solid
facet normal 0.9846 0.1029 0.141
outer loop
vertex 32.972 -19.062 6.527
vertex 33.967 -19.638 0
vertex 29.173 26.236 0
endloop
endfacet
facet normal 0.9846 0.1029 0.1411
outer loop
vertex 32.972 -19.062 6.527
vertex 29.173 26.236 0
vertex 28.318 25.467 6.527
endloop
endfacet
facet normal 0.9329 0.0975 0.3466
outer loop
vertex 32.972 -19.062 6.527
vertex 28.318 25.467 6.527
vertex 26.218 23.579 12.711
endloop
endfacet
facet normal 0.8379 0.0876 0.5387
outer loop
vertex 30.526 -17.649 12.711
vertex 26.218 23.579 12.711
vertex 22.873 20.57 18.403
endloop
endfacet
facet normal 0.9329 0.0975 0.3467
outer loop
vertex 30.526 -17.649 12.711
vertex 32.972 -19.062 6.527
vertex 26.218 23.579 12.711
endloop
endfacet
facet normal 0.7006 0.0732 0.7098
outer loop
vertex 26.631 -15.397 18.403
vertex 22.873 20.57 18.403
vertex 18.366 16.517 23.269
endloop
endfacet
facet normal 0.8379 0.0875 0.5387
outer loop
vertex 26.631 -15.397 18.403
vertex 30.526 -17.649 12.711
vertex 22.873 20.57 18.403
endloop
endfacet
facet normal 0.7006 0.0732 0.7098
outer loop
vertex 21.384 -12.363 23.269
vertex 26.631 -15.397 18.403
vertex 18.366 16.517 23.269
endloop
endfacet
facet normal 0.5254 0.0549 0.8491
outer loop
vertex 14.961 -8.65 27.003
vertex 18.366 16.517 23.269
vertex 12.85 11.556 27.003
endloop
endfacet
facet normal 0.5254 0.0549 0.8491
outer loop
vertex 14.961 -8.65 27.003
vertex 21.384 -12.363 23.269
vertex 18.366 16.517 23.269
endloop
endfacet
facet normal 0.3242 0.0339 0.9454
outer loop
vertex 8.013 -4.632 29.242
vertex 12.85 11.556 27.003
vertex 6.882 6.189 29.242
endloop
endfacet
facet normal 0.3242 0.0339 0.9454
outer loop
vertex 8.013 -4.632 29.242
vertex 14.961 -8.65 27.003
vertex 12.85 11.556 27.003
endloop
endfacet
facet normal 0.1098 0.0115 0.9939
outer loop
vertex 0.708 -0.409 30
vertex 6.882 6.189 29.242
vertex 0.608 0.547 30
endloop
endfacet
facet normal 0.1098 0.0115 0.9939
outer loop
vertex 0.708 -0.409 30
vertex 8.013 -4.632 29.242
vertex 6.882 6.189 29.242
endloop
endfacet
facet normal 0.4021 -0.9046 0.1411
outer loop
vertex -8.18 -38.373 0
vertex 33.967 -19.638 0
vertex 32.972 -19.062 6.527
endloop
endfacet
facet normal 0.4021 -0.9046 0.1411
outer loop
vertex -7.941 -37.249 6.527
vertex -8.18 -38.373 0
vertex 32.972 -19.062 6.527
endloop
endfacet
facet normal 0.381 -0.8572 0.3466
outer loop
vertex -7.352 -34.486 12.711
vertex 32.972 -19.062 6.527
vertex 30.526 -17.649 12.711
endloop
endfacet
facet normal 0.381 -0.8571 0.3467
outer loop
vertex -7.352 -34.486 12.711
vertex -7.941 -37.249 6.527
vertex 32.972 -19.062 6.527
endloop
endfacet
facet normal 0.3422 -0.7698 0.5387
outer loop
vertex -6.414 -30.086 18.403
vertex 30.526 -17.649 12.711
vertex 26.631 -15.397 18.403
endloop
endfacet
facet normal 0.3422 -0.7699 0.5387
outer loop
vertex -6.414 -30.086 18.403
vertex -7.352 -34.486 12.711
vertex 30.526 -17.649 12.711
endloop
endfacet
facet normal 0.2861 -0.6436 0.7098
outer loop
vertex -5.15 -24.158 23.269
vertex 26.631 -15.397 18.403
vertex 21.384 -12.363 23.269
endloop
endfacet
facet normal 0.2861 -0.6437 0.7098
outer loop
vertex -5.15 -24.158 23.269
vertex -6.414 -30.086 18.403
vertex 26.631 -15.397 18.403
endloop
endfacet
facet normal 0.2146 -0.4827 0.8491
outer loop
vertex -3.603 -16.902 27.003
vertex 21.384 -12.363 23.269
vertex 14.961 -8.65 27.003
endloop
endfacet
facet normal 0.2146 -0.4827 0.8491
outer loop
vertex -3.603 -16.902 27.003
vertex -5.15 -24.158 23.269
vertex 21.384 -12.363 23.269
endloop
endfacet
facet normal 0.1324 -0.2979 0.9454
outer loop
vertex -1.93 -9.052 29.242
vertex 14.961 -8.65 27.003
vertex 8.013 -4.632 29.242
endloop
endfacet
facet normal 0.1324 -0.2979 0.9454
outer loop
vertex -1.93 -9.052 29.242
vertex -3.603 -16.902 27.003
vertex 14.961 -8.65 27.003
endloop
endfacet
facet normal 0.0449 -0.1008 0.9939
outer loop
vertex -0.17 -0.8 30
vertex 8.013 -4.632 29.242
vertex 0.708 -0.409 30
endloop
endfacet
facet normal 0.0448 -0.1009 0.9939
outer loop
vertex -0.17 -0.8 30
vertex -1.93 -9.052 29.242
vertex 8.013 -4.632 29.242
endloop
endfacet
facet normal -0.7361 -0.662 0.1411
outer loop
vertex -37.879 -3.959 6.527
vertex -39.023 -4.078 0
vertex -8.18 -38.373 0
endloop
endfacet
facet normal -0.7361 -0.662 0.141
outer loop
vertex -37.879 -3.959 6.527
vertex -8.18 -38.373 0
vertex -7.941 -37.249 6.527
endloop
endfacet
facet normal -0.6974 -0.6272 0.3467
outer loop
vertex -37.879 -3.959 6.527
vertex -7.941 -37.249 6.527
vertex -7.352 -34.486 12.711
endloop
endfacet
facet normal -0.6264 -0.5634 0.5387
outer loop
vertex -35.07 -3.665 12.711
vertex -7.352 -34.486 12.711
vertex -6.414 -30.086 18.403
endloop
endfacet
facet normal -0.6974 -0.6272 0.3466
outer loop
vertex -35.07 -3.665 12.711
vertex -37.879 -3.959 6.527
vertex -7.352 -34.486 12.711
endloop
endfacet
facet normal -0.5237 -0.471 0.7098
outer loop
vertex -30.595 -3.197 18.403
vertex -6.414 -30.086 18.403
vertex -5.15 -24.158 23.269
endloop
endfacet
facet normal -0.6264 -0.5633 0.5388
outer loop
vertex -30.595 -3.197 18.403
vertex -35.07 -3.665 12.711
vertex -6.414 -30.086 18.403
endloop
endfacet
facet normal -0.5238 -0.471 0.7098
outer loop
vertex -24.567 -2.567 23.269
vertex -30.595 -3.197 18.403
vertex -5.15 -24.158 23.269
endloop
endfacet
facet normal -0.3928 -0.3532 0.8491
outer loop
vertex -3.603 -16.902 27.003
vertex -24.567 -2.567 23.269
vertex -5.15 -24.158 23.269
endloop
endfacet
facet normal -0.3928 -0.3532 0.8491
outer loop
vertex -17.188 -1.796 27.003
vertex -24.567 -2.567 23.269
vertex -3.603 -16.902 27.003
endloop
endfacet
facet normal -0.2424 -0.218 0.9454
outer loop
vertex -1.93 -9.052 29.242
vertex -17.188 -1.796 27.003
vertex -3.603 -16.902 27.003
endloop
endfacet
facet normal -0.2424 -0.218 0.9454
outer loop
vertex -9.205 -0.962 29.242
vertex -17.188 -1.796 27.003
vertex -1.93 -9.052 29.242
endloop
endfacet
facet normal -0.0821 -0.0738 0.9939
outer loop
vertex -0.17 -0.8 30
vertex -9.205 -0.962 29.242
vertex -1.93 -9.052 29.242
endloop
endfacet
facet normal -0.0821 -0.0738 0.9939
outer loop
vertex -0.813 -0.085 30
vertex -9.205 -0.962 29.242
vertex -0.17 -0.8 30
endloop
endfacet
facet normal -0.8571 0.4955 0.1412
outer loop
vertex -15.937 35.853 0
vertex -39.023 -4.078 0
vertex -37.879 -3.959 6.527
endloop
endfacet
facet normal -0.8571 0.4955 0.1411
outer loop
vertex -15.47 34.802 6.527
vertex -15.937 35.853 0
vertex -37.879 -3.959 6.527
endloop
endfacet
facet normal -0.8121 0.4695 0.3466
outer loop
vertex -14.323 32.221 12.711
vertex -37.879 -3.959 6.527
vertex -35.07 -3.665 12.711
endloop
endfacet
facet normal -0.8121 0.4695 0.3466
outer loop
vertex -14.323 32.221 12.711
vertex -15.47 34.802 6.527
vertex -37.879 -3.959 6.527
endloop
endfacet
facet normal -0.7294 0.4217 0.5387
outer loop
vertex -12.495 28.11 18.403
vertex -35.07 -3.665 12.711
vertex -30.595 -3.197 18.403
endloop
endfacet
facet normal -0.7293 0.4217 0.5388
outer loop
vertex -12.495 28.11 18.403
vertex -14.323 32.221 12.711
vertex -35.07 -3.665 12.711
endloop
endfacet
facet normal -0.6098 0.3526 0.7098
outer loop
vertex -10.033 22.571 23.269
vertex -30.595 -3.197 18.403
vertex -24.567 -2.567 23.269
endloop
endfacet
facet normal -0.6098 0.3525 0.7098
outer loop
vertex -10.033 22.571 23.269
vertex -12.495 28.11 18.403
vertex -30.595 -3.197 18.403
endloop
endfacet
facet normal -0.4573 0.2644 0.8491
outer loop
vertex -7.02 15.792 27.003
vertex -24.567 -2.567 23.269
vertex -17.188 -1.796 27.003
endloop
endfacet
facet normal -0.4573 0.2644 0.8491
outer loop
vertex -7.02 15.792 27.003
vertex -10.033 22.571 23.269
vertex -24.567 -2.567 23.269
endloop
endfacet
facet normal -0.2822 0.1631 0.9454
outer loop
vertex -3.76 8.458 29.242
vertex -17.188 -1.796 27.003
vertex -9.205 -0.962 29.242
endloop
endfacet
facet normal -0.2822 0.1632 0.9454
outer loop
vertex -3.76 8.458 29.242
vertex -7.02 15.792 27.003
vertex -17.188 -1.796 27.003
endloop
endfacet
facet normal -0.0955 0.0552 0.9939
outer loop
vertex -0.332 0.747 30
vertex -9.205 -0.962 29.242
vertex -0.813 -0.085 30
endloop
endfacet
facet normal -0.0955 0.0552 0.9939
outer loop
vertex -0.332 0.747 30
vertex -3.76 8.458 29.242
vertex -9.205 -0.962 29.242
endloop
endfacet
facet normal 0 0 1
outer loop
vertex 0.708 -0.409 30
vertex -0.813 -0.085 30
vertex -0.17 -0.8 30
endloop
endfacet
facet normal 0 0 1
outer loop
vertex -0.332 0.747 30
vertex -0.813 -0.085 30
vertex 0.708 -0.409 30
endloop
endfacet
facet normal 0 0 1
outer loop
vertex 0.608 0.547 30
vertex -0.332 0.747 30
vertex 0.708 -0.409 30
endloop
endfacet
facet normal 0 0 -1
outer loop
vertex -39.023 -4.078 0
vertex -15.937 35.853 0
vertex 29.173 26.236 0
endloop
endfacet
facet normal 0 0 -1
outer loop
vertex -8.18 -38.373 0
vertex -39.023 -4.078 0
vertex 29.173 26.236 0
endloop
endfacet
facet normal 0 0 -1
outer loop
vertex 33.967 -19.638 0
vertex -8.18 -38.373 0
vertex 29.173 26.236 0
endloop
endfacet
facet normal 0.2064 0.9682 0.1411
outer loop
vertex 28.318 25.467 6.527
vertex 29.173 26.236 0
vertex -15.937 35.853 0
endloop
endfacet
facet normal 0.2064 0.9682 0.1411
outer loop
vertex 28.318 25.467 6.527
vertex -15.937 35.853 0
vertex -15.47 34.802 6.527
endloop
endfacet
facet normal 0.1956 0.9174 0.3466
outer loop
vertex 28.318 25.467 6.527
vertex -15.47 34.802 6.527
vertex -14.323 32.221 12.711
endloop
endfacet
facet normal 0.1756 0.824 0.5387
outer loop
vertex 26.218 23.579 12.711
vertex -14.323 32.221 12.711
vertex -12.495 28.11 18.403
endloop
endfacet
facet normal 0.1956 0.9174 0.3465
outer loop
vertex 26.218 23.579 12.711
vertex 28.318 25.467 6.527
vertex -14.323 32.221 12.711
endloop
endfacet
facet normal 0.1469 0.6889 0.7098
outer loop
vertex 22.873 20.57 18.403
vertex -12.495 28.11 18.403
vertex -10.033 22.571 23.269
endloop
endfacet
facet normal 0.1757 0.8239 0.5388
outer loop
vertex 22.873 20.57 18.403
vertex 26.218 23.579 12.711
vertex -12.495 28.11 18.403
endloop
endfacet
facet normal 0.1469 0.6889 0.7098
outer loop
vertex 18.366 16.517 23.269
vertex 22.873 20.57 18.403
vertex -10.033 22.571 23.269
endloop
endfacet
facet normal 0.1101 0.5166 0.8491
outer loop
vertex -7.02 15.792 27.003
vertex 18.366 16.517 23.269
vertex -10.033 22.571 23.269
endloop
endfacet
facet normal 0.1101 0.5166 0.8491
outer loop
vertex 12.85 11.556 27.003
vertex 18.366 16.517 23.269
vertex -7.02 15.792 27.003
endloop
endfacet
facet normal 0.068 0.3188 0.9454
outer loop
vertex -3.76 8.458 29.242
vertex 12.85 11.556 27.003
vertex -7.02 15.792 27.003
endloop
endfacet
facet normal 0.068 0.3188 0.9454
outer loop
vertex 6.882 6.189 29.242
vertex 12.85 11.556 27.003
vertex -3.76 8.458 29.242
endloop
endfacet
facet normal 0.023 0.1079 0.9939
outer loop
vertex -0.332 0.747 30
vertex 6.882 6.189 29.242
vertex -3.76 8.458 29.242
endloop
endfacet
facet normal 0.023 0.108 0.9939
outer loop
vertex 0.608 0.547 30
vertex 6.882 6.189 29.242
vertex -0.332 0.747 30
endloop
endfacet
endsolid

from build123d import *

# Parameters (mm, degrees)
F1_DEPTH    = 30
F2_T1_DEPTH = 201.5265861528
F2_T3_DEPTH = 201.5265861528
F2_T5_DEPTH = 201.5265861528
F2_T7_DEPTH = 201.5265861528
F2_T9_DEPTH = 201.5265861528


# Not quite as in the source:
# - a fillet or chamfer that OpenCascade refuses, or shapes differently, is made with other operations: its cross-section is extruded or revolved along the edge and cut away or added


with BuildPart() as f1:
    # F0 (on Top) → F1 (new body)
    with BuildSketch(Plane.XY):
        Polygon((-15.9371768066, 35.8527074811), (-39.0228095523, -4.0780599472), (-8.1802458333, -38.3730871366), (33.967139591, -19.6378121565), (29.1730926011, 26.2362517592), align=None)
    extrude(amount=F1_DEPTH)

    # F2: fillet of radius 31.1 on 5 edges, made by hand

    # F2_s2 → F2_t1 (cut)
    with BuildSketch(Plane(origin=(50.4334024594, 87.2336698068, 0), x_dir=(0, 0, 1), z_dir=(-0.5005136386, -0.8657286512, 0))):
        with BuildLine():
            ThreePointArc((0, 31.7420396575), (21.2765502256, 22.2601101881), (30, 0.6614991217))
            Line((30, 0.6614991217), (30, 31.7420396575))
            Line((30, 31.7420396575), (0, 31.7420396575))
        make_face()
    extrude(amount=F2_T1_DEPTH, mode=Mode.SUBTRACT)

    # F2_s4 → F2_t3 (cut)
    with BuildSketch(Plane(origin=(-67.379371666, 74.9217025, 0), x_dir=(0, 0, 1), z_dir=(0.6686896548, -0.7435416233, 0))):
        with BuildLine():
            ThreePointArc((0, 31.7420396575), (21.2765502256, 22.2601101881), (30, 0.6614991217))
            Line((30, 0.6614991217), (30, 31.7420396575))
            Line((30, 31.7420396575), (0, 31.7420396575))
        make_face()
    extrude(amount=F2_T3_DEPTH, mode=Mode.SUBTRACT)

    # F2_s6 → F2_t5 (cut)
    with BuildSketch(Plane(origin=(-92.0761442896, -40.9295111669, 0), x_dir=(0, 0, 1), z_dir=(0.9137865732, 0.406194656, 0))):
        with BuildLine():
            ThreePointArc((0, 31.7420396575), (21.2765502256, 22.2601101881), (30, 0.6614991217))
            Line((30, 0.6614991217), (30, 31.7420396575))
            Line((30, 31.7420396575), (0, 31.7420396575))
        make_face()
    extrude(amount=F2_T5_DEPTH, mode=Mode.SUBTRACT)

    # F2_s8 → F2_t7 (cut)
    with BuildSketch(Plane(origin=(10.473184942, -100.217531544, 0), x_dir=(0, 0, 1), z_dir=(-0.1039384941, 0.9945837267, 0))):
        with BuildLine():
            ThreePointArc((0, 31.7420396575), (21.2765502256, 22.2601101881), (30, 0.6614991217))
            Line((30, 0.6614991217), (30, 31.7420396575))
            Line((30, 31.7420396575), (0, 31.7420396575))
        make_face()
    extrude(amount=F2_T7_DEPTH, mode=Mode.SUBTRACT)

    # F2_s10 → F2_t9 (cut)
    with BuildSketch(Plane(origin=(98.5489285542, -21.0083295959, 0), x_dir=(0, 0, 1), z_dir=(-0.9780240953, 0.2084918918, 0))):
        with BuildLine():
            ThreePointArc((0, 31.7420396575), (21.2765502256, 22.2601101881), (30, 0.6614991217))
            Line((30, 0.6614991217), (30, 31.7420396575))
            Line((30, 31.7420396575), (0, 31.7420396575))
        make_face()
    extrude(amount=F2_T9_DEPTH, mode=Mode.SUBTRACT)


solid = f1.part
